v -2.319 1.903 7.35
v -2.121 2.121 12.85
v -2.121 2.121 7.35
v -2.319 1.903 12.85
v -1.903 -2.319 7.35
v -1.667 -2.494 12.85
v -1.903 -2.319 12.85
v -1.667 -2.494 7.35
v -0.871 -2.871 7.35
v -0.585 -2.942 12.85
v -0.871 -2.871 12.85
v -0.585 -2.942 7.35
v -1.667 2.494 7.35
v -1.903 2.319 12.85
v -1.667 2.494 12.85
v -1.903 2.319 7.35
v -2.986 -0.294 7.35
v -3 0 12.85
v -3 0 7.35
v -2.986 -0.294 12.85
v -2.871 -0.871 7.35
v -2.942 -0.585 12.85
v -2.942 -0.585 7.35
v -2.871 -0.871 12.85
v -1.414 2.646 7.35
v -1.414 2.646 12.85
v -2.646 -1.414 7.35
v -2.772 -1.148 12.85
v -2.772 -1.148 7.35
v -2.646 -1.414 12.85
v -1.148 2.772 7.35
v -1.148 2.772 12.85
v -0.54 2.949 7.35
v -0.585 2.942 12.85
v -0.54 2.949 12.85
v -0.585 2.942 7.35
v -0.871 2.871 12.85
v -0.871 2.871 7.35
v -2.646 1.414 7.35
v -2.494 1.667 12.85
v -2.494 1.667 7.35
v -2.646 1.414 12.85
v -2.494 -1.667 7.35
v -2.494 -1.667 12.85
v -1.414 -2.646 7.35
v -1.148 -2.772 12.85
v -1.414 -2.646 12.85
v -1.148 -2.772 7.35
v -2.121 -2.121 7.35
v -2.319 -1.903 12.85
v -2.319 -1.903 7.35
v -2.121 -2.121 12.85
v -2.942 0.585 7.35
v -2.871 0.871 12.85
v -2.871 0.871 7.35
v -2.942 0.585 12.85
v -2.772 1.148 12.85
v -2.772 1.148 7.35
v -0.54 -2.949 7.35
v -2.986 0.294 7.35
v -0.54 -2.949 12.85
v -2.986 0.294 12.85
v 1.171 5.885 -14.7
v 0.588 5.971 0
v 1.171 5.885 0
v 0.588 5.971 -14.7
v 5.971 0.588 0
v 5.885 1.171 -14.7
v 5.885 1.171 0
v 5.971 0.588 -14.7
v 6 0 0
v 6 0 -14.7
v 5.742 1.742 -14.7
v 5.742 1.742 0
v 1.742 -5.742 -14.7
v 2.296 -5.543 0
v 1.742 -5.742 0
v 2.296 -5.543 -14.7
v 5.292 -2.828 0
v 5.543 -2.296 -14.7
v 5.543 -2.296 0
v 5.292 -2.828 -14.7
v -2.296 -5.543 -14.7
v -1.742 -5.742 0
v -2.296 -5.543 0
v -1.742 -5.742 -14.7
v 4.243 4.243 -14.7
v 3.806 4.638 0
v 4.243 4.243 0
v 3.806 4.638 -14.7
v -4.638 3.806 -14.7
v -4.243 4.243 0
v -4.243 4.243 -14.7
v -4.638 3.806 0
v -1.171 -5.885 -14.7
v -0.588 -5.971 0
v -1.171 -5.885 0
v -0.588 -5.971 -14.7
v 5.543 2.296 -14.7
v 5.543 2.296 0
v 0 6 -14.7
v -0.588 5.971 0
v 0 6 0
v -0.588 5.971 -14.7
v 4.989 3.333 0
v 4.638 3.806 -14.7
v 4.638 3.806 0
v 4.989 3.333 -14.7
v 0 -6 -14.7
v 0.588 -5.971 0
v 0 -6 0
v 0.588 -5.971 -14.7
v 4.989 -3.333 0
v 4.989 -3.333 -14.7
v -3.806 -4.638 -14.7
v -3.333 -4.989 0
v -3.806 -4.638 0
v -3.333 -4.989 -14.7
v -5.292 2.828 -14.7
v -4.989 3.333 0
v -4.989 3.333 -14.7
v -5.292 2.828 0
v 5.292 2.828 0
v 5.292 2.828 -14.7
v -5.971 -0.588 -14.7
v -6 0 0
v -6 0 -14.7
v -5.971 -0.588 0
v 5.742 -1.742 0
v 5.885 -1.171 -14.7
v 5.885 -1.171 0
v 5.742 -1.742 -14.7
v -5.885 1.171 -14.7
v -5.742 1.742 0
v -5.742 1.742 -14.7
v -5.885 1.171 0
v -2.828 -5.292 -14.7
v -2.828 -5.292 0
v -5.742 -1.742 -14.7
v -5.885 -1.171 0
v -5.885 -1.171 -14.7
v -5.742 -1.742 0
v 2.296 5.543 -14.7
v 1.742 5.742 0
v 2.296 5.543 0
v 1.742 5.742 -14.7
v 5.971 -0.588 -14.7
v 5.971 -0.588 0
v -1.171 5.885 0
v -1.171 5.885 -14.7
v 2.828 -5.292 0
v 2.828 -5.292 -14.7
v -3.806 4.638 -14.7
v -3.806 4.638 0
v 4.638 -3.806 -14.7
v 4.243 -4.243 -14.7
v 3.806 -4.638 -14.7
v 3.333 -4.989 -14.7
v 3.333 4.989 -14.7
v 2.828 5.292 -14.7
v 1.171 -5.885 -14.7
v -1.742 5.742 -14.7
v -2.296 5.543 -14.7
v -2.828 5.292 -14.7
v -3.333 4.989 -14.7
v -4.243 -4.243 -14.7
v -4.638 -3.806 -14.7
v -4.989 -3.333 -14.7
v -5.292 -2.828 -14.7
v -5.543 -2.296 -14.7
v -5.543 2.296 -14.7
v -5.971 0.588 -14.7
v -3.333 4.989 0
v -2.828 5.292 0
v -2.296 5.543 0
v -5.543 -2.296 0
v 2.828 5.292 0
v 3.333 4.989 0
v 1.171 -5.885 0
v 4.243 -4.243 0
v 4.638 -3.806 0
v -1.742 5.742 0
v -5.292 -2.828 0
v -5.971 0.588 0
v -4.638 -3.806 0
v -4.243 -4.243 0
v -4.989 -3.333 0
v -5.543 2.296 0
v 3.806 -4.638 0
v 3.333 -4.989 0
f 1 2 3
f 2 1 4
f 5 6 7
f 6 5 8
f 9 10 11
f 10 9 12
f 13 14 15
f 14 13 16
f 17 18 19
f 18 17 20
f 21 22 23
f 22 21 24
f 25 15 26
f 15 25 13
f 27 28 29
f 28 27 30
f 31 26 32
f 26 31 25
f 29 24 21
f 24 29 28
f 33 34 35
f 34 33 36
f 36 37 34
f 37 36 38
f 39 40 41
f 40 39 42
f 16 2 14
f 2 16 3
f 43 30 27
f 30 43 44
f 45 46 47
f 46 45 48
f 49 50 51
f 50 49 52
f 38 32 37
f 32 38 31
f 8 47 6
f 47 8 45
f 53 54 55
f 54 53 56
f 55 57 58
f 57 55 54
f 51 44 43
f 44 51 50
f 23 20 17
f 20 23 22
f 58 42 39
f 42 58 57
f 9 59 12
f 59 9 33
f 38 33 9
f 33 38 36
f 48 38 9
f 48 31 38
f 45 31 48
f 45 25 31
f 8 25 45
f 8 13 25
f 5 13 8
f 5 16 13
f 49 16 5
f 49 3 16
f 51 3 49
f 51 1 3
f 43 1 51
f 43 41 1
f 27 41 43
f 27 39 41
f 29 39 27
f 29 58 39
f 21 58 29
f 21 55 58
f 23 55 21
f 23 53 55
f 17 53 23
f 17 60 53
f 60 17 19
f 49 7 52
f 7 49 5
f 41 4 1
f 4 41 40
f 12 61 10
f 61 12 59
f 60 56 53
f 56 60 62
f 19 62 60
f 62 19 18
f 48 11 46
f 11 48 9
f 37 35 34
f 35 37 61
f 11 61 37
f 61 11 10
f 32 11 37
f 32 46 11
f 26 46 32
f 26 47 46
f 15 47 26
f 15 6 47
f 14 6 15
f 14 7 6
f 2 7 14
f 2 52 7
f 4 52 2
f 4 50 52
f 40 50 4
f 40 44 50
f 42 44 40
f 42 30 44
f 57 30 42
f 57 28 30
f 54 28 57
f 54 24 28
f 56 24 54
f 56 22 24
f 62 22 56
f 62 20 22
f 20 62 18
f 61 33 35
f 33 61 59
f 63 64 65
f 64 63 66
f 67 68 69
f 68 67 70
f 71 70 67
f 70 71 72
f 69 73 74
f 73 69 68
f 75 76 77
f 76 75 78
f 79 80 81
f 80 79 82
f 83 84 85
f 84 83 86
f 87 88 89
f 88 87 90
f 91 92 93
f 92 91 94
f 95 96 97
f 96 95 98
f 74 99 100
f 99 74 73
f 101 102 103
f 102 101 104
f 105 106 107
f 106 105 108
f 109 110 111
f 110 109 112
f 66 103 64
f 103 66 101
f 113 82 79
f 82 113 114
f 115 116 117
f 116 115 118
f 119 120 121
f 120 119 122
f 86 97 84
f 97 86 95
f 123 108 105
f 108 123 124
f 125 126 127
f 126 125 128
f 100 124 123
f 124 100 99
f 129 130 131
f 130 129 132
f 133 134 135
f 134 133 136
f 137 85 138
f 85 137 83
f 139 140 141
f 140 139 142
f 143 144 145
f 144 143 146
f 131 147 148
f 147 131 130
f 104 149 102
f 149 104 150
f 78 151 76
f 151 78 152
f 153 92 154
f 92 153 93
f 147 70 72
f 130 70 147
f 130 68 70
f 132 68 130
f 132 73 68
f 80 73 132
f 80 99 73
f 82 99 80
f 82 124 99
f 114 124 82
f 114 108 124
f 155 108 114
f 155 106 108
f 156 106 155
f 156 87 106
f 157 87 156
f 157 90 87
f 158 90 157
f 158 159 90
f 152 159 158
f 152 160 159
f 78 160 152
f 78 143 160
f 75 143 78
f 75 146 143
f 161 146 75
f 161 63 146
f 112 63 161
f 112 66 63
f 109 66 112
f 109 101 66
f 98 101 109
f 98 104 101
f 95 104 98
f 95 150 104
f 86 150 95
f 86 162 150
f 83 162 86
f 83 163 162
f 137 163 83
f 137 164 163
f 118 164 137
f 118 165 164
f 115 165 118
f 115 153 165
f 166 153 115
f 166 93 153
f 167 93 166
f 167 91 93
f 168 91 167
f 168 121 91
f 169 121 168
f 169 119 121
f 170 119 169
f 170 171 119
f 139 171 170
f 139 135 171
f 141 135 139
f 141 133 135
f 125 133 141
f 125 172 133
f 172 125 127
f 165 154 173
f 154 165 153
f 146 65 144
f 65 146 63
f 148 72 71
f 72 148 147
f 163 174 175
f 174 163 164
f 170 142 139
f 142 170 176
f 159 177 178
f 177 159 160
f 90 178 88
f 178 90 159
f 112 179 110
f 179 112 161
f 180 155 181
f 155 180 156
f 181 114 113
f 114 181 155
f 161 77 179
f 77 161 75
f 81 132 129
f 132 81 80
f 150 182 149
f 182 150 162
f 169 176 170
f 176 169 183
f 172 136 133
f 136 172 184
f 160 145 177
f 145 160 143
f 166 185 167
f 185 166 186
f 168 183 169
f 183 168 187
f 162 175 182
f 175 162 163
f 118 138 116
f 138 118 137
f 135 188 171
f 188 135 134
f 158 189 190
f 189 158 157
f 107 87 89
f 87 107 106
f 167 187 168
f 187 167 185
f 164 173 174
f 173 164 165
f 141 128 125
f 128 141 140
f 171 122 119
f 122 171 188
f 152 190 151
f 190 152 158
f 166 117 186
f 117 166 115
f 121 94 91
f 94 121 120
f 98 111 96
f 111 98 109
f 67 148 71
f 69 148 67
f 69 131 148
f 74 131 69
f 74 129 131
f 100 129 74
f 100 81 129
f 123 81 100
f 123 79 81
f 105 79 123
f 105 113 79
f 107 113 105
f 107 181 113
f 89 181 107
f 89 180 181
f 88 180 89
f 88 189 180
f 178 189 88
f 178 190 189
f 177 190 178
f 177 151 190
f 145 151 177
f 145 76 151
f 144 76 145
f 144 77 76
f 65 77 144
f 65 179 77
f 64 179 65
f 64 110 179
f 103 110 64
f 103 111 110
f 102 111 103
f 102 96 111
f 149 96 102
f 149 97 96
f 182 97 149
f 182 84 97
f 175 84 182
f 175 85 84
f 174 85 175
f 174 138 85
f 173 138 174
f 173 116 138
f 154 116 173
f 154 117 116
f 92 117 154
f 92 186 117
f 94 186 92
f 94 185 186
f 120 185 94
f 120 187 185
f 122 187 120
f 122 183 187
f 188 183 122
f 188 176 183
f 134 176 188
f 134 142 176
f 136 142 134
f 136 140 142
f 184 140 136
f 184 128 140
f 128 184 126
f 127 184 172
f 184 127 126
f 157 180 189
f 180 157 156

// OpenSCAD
$fn=64;

motor_params = [6, 5.5, 14.7, 12]; // [shaft_d, shaft_len, body_len, body_d]

module d_shaft(d=6, l=5.5, flat_ratio=0.82) {
    flat_offset = d * (1 - flat_ratio) * 0.5;
    difference() {
        cylinder(d=d, h=l, center=false);
        translate([d/2 - flat_offset, 0, l/2])
            cube([d, d*2, l+0.2], center=true);
    }
}

module gear_motor(p=[6,5.5,14.7,12]) {
    shaft_d = p[0];
    shaft_len = p[1];
    body_len = p[2];
    body_d = p[3];

    union() {
        translate([0,0,-body_len/2])
            cylinder(d=body_d, h=body_len, center=true);

        translate([0,0, body_len/2])
            d_shaft(d=shaft_d, l=shaft_len, flat_ratio=0.82);

        translate([0,0,-body_len/2 - 1.2])
            cylinder(d=body_d*0.92, h=2.4, center=true);

        translate([0,0,-body_len/2 - 2.4])
            cylinder(d=body_d*0.55, h=2.4, center=true);
    }
}

gear_motor(motor_params);
